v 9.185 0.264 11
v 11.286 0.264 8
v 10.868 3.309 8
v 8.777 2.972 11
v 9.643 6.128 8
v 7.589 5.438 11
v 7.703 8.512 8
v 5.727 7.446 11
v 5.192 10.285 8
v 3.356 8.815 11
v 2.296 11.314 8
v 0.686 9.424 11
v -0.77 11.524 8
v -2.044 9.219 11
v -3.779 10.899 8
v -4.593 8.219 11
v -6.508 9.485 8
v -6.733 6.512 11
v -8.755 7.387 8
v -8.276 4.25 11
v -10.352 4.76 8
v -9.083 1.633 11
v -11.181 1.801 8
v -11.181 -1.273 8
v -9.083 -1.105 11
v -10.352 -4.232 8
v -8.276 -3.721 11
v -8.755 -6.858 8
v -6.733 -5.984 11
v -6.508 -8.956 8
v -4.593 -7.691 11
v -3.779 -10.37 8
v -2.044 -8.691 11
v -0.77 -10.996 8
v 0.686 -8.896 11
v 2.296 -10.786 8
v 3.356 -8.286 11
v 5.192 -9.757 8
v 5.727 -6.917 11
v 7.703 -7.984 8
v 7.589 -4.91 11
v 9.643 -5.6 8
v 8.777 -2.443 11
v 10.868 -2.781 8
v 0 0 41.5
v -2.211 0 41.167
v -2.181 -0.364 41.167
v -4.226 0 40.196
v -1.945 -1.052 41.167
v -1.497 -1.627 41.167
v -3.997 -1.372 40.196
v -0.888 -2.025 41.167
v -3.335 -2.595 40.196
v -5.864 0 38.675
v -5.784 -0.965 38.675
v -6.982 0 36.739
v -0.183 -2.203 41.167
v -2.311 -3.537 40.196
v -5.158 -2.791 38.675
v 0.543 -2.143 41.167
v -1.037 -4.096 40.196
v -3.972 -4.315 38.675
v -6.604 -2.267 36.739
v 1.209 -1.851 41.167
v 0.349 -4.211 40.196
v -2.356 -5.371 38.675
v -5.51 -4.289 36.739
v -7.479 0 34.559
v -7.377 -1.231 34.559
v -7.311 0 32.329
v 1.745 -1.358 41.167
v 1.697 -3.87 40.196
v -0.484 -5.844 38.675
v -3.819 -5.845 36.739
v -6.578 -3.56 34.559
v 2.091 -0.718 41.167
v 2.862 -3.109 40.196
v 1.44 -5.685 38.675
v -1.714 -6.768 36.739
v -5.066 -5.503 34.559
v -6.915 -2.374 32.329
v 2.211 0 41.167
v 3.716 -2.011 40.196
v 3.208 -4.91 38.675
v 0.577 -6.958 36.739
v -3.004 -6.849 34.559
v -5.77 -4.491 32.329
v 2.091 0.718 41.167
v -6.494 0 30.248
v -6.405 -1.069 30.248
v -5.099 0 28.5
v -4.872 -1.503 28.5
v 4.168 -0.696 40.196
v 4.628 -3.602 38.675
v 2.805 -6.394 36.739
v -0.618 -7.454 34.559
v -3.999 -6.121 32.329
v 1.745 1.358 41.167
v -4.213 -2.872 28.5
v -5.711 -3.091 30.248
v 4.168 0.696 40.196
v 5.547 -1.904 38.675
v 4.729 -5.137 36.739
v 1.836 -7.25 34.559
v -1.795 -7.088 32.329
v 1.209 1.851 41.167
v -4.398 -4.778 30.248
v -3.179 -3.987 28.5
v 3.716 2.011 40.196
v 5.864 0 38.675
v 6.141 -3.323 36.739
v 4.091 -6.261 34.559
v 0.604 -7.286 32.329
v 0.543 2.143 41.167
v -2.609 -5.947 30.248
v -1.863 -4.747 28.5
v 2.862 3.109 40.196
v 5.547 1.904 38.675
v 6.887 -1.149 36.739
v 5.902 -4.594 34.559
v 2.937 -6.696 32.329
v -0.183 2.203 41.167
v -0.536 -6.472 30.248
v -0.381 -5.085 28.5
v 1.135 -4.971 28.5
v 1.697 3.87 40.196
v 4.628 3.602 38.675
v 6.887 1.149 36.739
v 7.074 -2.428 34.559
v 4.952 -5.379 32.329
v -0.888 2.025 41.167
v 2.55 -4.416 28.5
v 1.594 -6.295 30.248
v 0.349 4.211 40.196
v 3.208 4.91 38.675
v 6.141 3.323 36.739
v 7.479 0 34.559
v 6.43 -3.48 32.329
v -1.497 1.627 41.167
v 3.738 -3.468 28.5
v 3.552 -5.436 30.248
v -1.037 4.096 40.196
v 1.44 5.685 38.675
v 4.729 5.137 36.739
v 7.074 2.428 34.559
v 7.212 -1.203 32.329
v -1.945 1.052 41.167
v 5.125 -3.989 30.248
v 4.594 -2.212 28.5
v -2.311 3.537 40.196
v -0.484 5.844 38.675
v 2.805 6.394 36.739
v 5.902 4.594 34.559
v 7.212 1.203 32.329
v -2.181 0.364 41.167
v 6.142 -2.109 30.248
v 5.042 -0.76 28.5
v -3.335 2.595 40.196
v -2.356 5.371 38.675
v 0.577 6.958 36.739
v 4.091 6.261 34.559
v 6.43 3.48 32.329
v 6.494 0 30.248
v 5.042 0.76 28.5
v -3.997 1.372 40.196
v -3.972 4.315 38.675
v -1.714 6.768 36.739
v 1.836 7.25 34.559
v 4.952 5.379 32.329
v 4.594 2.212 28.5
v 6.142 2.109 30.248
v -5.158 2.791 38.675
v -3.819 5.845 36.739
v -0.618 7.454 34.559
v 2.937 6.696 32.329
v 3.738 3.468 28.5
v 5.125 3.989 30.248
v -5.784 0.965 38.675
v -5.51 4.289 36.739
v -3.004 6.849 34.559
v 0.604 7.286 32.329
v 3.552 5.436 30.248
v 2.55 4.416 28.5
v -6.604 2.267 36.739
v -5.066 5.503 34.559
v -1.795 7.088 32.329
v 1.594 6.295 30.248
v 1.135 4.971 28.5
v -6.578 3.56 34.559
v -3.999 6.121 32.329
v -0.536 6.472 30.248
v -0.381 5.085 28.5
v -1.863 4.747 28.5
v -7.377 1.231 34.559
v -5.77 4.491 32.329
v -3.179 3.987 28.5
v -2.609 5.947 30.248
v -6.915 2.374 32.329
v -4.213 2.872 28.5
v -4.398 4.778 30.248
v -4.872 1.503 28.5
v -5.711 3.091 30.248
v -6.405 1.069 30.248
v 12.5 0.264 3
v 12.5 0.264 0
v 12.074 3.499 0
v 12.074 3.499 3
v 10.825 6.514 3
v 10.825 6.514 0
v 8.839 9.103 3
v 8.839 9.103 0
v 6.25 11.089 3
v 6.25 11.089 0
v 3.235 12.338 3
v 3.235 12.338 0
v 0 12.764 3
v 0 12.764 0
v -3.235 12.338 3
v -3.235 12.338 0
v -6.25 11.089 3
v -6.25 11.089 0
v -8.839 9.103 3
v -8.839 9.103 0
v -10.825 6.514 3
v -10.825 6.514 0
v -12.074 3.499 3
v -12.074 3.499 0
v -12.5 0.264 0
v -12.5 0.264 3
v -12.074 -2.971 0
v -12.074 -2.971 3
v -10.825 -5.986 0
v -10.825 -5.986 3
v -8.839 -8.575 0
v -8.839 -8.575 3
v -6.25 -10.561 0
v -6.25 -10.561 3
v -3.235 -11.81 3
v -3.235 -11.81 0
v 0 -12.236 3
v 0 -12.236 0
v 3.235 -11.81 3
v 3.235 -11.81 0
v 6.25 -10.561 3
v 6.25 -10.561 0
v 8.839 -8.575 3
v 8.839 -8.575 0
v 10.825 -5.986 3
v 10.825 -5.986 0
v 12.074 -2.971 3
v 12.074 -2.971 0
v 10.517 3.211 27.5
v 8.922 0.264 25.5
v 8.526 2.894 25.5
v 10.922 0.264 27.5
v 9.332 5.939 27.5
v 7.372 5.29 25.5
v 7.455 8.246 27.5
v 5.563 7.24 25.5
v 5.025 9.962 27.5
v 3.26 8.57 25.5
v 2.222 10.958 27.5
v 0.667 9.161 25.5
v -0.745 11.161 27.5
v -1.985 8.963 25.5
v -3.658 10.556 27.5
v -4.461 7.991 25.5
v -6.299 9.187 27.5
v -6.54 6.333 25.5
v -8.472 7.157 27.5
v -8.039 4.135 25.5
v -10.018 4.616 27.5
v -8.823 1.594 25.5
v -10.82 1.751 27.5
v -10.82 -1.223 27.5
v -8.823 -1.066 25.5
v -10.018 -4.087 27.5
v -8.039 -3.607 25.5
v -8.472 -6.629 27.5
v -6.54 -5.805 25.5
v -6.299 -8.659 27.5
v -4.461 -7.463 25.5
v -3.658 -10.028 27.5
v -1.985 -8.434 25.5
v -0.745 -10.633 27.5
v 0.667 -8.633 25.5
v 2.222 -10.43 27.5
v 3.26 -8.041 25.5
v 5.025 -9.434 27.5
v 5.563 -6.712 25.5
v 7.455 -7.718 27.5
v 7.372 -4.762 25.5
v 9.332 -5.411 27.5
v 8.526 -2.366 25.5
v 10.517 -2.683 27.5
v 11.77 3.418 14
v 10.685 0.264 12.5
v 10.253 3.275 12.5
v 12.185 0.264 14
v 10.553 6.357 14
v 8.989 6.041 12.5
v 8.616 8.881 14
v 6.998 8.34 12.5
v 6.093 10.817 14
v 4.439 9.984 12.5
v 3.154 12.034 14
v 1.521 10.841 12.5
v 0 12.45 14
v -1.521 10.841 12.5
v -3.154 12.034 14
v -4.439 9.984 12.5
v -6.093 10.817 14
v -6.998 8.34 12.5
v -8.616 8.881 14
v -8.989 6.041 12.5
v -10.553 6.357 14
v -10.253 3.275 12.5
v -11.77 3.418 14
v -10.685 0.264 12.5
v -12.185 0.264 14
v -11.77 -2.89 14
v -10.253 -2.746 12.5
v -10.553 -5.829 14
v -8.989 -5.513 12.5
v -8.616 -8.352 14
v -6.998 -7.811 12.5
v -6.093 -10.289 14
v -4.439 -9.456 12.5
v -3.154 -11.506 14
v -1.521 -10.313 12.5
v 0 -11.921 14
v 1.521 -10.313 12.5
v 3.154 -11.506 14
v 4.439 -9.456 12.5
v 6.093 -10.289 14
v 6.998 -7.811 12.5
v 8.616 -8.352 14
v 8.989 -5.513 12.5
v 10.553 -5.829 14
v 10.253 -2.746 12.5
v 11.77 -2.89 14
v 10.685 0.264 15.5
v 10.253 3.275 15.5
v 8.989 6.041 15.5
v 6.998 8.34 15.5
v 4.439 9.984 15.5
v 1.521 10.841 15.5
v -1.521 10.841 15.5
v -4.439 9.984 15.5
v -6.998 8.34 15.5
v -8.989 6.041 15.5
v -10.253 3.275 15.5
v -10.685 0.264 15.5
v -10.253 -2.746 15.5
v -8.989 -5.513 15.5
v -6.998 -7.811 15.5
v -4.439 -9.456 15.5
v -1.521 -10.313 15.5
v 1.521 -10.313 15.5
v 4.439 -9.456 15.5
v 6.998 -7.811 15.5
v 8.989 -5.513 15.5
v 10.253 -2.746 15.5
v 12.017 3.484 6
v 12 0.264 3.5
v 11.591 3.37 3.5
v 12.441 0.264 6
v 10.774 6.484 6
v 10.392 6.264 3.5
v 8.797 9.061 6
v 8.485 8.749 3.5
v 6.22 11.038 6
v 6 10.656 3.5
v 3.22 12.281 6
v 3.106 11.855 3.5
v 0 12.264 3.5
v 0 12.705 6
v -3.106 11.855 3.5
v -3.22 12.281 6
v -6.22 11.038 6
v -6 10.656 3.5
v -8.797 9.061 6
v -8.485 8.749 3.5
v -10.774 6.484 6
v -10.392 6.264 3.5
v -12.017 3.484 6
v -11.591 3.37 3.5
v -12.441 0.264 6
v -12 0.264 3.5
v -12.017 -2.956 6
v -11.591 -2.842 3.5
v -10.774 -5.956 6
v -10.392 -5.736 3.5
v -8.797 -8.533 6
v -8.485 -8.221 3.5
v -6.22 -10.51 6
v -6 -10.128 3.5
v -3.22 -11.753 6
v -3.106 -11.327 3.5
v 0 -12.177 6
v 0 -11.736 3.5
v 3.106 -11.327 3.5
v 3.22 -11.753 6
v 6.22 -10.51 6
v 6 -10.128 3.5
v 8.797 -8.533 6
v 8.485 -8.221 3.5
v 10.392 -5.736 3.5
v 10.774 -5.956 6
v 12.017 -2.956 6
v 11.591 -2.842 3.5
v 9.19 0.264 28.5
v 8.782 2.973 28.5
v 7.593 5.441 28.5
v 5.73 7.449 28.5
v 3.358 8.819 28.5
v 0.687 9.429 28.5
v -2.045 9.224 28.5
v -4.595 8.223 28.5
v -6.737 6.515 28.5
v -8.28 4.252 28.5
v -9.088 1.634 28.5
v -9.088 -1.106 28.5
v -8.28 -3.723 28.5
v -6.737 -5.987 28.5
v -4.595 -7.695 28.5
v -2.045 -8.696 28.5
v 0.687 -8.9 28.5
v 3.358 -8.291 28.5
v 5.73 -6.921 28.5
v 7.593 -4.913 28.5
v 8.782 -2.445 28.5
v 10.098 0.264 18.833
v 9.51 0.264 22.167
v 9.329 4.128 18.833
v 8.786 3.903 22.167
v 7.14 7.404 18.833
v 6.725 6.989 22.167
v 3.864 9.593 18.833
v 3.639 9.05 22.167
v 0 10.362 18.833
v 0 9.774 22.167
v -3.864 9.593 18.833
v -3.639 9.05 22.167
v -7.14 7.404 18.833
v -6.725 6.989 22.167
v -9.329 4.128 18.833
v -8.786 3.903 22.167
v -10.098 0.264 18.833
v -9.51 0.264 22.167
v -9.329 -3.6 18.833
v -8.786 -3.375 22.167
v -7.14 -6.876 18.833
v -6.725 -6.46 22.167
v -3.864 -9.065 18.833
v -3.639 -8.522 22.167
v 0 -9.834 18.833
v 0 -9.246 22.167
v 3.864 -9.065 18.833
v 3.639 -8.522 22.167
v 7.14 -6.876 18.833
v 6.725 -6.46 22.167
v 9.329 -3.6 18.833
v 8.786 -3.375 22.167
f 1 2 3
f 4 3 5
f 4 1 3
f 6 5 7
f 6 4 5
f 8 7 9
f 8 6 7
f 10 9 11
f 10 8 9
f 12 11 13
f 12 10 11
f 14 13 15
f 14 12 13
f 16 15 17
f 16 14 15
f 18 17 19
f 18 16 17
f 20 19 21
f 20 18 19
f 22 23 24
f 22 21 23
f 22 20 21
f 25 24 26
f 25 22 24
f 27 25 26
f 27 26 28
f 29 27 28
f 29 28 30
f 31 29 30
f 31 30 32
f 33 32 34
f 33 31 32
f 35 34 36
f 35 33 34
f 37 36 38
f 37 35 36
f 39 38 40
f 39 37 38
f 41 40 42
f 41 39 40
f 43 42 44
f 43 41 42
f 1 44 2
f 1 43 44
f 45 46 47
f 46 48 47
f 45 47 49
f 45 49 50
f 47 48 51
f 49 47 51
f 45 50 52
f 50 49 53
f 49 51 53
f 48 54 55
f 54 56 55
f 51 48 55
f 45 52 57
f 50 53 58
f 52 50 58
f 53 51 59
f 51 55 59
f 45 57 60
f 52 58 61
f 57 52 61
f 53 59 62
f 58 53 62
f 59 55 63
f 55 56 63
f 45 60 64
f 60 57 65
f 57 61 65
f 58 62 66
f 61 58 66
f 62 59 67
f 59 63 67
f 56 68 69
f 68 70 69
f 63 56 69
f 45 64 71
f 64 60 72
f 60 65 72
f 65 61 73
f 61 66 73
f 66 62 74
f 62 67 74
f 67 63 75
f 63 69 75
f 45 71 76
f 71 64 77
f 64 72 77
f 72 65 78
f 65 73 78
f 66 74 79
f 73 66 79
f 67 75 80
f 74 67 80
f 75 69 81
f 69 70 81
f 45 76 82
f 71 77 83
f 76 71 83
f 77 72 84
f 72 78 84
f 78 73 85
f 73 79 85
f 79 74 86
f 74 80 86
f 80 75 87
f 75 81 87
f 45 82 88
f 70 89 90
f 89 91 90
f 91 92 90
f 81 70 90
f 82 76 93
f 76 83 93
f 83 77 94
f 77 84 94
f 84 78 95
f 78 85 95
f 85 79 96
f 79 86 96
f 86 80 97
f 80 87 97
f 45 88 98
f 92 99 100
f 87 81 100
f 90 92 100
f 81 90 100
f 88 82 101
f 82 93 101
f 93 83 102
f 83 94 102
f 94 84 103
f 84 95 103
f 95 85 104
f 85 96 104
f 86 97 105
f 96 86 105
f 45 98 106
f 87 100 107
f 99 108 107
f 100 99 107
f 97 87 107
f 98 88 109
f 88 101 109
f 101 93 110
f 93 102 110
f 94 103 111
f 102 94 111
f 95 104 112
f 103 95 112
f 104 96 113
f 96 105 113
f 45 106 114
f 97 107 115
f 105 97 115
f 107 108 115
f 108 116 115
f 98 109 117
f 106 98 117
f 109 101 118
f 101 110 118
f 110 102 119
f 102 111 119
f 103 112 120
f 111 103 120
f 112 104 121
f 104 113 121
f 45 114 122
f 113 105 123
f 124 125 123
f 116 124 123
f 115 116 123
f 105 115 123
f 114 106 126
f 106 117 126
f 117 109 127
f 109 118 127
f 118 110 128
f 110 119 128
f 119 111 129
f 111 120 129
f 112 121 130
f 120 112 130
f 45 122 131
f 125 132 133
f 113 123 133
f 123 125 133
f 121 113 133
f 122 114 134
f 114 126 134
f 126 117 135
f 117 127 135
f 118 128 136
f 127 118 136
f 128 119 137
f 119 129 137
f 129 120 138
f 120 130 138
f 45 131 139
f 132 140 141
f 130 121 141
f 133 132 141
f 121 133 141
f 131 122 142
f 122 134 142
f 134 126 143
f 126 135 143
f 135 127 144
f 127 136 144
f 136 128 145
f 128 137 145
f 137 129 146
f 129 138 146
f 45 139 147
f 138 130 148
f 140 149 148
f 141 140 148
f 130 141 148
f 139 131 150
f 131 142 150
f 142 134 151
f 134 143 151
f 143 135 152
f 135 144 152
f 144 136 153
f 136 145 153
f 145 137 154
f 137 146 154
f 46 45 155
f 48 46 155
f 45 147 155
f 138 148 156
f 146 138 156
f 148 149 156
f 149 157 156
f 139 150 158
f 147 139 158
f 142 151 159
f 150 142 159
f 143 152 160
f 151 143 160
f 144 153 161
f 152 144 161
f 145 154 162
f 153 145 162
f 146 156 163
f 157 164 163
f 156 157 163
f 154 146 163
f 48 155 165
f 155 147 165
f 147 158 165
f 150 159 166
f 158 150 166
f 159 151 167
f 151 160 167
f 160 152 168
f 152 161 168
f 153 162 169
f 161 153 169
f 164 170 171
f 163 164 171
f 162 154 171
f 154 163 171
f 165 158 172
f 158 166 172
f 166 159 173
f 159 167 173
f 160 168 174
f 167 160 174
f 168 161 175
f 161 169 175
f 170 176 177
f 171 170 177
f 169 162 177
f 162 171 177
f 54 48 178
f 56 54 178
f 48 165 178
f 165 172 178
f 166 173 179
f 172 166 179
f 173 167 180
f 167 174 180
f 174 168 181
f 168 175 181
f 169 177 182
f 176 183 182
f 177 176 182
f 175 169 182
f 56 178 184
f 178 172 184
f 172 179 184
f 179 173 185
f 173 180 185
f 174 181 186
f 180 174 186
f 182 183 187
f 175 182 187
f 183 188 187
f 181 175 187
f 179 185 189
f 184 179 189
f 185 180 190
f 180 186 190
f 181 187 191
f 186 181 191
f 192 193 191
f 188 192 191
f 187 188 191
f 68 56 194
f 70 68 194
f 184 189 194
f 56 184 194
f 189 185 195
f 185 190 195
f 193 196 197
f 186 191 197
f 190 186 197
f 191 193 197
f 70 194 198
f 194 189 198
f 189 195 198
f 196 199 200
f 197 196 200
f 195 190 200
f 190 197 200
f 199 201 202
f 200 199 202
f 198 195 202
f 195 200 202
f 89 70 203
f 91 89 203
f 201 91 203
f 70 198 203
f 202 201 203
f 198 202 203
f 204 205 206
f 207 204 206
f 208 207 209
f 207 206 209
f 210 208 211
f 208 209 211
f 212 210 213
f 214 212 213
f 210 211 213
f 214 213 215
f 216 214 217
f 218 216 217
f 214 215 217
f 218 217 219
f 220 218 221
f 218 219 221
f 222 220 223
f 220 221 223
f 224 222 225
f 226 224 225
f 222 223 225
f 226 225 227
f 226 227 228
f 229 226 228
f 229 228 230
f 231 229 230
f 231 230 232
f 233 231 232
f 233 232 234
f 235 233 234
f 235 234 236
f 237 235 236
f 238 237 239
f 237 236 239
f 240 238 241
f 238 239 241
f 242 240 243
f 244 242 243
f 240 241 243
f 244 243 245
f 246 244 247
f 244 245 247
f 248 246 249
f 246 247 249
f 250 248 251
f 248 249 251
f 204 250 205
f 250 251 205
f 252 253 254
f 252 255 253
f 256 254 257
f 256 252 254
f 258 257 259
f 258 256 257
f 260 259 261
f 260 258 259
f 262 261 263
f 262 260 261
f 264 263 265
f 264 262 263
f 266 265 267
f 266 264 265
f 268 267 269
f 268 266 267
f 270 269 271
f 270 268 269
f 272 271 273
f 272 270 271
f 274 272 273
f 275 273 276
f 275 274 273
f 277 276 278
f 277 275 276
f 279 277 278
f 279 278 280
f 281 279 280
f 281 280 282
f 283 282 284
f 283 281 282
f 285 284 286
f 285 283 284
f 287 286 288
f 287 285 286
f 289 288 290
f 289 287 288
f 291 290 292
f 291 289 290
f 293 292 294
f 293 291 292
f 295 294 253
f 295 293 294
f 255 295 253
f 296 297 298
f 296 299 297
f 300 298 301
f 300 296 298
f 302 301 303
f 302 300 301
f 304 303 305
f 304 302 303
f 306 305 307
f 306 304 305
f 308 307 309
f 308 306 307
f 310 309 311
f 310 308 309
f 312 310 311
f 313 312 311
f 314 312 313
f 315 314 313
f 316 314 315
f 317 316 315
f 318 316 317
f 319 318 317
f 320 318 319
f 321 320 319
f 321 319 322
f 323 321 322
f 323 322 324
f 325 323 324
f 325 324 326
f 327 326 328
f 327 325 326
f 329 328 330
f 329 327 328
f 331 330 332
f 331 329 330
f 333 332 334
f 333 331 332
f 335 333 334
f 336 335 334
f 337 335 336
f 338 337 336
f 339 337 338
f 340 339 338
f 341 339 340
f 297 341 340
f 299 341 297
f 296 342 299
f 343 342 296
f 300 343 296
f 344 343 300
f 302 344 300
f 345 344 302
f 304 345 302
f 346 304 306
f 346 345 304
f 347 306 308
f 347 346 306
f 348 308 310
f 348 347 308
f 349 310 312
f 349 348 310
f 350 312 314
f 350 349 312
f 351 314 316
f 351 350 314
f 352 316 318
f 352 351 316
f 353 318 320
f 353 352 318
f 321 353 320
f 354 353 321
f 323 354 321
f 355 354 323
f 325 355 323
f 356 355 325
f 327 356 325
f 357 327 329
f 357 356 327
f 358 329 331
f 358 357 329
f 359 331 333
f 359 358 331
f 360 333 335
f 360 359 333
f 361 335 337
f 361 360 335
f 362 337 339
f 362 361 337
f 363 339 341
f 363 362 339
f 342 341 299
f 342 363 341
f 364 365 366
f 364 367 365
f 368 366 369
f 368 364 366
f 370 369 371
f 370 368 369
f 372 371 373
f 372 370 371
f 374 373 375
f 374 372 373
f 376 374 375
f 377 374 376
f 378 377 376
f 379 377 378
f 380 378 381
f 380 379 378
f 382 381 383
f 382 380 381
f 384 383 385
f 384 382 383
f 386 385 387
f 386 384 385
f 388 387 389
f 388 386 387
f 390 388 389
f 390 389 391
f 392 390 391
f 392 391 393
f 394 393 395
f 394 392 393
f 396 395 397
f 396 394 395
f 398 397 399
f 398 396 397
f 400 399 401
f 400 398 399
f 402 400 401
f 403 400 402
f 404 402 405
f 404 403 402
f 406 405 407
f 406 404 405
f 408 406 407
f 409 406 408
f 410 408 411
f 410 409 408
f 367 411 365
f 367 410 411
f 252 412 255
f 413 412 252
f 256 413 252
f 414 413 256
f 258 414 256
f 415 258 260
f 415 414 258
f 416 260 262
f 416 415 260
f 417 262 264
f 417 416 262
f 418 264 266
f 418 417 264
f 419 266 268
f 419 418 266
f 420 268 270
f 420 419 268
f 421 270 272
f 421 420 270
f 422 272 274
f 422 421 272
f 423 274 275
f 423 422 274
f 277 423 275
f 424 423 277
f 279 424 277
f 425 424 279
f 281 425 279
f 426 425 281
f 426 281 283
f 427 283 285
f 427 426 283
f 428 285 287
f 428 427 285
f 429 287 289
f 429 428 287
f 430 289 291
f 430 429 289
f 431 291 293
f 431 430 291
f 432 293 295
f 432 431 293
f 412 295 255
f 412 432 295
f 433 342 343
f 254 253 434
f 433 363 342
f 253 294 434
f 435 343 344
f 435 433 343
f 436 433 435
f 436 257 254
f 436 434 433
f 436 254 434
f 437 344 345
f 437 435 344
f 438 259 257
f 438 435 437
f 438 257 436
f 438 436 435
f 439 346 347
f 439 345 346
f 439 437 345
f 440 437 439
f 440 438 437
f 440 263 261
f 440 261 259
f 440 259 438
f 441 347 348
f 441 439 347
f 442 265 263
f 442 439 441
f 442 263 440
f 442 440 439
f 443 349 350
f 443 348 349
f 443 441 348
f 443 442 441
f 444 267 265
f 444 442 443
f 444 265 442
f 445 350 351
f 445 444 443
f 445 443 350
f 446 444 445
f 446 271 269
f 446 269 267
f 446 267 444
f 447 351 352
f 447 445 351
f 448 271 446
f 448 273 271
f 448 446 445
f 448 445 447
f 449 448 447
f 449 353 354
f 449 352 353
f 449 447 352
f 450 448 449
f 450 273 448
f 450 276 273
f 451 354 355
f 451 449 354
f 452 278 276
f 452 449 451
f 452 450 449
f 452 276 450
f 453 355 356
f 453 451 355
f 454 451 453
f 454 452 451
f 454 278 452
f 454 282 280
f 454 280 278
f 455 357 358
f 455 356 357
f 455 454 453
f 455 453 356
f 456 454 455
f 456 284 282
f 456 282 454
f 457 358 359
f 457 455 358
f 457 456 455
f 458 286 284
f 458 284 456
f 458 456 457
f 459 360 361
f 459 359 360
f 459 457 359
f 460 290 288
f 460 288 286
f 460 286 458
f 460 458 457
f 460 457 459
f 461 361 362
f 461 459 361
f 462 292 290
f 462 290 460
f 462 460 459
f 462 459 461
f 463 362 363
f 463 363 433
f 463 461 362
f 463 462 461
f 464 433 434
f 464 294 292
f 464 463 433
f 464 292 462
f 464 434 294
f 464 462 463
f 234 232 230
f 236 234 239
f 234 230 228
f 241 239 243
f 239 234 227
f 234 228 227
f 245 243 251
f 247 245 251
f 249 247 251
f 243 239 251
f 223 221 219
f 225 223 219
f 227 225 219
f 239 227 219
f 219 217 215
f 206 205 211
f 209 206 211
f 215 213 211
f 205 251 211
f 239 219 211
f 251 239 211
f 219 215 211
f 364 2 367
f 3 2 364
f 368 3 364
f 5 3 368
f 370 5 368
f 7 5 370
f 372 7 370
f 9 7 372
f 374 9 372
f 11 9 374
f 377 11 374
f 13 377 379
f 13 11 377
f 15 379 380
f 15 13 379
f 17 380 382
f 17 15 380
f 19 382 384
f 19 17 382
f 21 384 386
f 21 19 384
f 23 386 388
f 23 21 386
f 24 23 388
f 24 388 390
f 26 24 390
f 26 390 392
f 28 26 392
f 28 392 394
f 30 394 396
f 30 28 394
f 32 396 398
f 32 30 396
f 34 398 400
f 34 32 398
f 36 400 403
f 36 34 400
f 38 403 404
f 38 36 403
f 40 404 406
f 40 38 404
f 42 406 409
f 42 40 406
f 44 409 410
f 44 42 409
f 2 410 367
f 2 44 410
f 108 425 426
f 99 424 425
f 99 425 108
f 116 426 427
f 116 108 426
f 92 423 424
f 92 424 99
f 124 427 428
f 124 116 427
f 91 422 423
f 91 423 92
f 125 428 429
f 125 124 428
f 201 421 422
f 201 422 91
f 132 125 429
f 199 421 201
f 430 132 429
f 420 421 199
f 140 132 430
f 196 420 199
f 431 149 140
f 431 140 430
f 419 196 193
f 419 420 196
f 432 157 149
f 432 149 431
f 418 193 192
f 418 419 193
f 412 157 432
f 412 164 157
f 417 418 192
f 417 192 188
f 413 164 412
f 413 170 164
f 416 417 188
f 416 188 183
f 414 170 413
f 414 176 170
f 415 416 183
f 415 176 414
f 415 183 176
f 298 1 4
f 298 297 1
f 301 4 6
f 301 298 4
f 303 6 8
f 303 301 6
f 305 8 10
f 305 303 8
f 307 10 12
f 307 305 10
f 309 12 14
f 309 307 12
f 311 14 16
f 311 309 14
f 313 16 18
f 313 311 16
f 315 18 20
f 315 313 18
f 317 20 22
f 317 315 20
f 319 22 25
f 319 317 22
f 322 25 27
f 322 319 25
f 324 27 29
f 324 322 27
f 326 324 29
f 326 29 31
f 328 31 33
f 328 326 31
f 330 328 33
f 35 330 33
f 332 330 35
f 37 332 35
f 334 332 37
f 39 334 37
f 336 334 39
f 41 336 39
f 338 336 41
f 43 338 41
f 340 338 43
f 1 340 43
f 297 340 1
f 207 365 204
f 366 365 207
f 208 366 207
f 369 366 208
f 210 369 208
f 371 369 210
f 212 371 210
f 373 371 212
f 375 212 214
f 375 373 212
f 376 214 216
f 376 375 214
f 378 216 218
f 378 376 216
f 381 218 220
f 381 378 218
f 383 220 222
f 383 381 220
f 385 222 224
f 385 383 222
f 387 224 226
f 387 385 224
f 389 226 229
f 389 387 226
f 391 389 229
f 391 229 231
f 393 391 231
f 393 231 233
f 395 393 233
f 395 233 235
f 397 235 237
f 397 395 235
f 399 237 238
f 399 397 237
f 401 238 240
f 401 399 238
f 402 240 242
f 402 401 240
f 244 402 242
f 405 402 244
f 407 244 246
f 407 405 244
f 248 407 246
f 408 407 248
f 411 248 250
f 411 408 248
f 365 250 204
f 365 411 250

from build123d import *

# Parameters (mm, degrees)
F0_R       = 12.5
F1_DEPTH   = 3
F1_FACE_R  = 12.5
F2_DEPTH   = 0.5
F2_TAPER   = 45
F2_FACE_R  = 12
F3_DEPTH   = 2.5
F3_TAPER   = -10
F3_FACE_R  = 12.4408174518
F4_DEPTH   = 2
F4_TAPER   = 30
F4_FACE_R  = 11.2861169134
F5_DEPTH   = 3
F5_TAPER   = 35
F5_FACE_R  = 9.1854942988
F6_DEPTH   = 1.5
F6_TAPER   = -45
F6_FACE_R  = 10.6854942988
F7_DEPTH   = 1.5
F7_TAPER   = -45
F7_FACE_R  = 12.1854942988
F8_DEPTH   = 1.5
F8_TAPER   = 45
F8_FACE_R  = 10.6854942988
F9_DEPTH   = 10
F9_TAPER   = 10
F9_FACE_R  = 8.9222244917
F10_DEPTH  = 2
F10_TAPER  = -45
F10_FACE_R = 10.9222244917
F11_DEPTH  = 1
F11_TAPER  = 60


with BuildPart() as f1:
    # F0 (on Top) → F1 (new body)
    with BuildSketch(Plane.XY):
        with Locations((0, 0.2640842248)):
            Circle(F0_R)
    extrude(amount=F1_DEPTH)

    # F1_face (on face) → F2 (join)
    with BuildSketch(Plane(origin=(0, 0.2640842248, 3), x_dir=(1, 0, 0), z_dir=(0, 0, 1))):
        Circle(F1_FACE_R)
    extrude(amount=F2_DEPTH, taper=F2_TAPER)

    # F2_face (on face) → F3 (join)
    with BuildSketch(Plane(origin=(0, 0.2640842248, 3.5), x_dir=(1, 0, 0), z_dir=(0, 0, 1))):
        Circle(F2_FACE_R)
    extrude(amount=F3_DEPTH, taper=F3_TAPER)

    # F3_face (on face) → F4 (join)
    with BuildSketch(Plane(origin=(0, 0.2640842248, 6), x_dir=(1, 0, 0), z_dir=(0, 0, 1))):
        Circle(F3_FACE_R)
    extrude(amount=F4_DEPTH, taper=F4_TAPER)

    # F4_face (on face) → F5 (join)
    with BuildSketch(Plane(origin=(0, 0.2640842248, 8), x_dir=(1, 0, 0), z_dir=(0, 0, 1))):
        Circle(F4_FACE_R)
    extrude(amount=F5_DEPTH, taper=F5_TAPER)

    # F5_face (on face) → F6 (join)
    with BuildSketch(Plane(origin=(0, 0.2640842248, 11), x_dir=(1, 0, 0), z_dir=(0, 0, 1))):
        Circle(F5_FACE_R)
    extrude(amount=F6_DEPTH, taper=F6_TAPER)

    # F6_face (on face) → F7 (join)
    with BuildSketch(Plane(origin=(0, 0.2640842248, 12.5), x_dir=(1, 0, 0), z_dir=(0, 0, 1))):
        Circle(F6_FACE_R)
    extrude(amount=F7_DEPTH, taper=F7_TAPER)

    # F7_face (on face) → F8 (join)
    with BuildSketch(Plane(origin=(0, 0.2640842248, 14), x_dir=(1, 0, 0), z_dir=(0, 0, 1))):
        Circle(F7_FACE_R)
    extrude(amount=F8_DEPTH, taper=F8_TAPER)

    # F8_face (on face) → F9 (join)
    with BuildSketch(Plane(origin=(0, 0.2640842248, 15.5), x_dir=(1, 0, 0), z_dir=(0, 0, 1))):
        Circle(F8_FACE_R)
    extrude(amount=F9_DEPTH, taper=F9_TAPER)

    # F9_face (on face) → F10 (join)
    with BuildSketch(Plane(origin=(0, 0.2640842248, 25.5), x_dir=(1, 0, 0), z_dir=(0, 0, 1))):
        Circle(F9_FACE_R)
    extrude(amount=F10_DEPTH, taper=F10_TAPER)

    # F10_face (on face) → F11 (join)
    with BuildSketch(Plane(origin=(0, 0.2640842248, 27.5), x_dir=(1, 0, 0), z_dir=(0, 0, 1))):
        Circle(F10_FACE_R)
    extrude(amount=F11_DEPTH, taper=F11_TAPER)

    # F12 (on Front) → F13 (revolve)
    with BuildSketch(Plane.XZ):
        with BuildLine():
            ThreePointArc((0, 41.5), (-7.5, 34), (0, 26.5))
            Line((0, 26.5), (0, 41.5))
        make_face()
    revolve(axis=Axis((0, 0, 35.2392694949), (0, 0, 1)))


solid = f1.part
